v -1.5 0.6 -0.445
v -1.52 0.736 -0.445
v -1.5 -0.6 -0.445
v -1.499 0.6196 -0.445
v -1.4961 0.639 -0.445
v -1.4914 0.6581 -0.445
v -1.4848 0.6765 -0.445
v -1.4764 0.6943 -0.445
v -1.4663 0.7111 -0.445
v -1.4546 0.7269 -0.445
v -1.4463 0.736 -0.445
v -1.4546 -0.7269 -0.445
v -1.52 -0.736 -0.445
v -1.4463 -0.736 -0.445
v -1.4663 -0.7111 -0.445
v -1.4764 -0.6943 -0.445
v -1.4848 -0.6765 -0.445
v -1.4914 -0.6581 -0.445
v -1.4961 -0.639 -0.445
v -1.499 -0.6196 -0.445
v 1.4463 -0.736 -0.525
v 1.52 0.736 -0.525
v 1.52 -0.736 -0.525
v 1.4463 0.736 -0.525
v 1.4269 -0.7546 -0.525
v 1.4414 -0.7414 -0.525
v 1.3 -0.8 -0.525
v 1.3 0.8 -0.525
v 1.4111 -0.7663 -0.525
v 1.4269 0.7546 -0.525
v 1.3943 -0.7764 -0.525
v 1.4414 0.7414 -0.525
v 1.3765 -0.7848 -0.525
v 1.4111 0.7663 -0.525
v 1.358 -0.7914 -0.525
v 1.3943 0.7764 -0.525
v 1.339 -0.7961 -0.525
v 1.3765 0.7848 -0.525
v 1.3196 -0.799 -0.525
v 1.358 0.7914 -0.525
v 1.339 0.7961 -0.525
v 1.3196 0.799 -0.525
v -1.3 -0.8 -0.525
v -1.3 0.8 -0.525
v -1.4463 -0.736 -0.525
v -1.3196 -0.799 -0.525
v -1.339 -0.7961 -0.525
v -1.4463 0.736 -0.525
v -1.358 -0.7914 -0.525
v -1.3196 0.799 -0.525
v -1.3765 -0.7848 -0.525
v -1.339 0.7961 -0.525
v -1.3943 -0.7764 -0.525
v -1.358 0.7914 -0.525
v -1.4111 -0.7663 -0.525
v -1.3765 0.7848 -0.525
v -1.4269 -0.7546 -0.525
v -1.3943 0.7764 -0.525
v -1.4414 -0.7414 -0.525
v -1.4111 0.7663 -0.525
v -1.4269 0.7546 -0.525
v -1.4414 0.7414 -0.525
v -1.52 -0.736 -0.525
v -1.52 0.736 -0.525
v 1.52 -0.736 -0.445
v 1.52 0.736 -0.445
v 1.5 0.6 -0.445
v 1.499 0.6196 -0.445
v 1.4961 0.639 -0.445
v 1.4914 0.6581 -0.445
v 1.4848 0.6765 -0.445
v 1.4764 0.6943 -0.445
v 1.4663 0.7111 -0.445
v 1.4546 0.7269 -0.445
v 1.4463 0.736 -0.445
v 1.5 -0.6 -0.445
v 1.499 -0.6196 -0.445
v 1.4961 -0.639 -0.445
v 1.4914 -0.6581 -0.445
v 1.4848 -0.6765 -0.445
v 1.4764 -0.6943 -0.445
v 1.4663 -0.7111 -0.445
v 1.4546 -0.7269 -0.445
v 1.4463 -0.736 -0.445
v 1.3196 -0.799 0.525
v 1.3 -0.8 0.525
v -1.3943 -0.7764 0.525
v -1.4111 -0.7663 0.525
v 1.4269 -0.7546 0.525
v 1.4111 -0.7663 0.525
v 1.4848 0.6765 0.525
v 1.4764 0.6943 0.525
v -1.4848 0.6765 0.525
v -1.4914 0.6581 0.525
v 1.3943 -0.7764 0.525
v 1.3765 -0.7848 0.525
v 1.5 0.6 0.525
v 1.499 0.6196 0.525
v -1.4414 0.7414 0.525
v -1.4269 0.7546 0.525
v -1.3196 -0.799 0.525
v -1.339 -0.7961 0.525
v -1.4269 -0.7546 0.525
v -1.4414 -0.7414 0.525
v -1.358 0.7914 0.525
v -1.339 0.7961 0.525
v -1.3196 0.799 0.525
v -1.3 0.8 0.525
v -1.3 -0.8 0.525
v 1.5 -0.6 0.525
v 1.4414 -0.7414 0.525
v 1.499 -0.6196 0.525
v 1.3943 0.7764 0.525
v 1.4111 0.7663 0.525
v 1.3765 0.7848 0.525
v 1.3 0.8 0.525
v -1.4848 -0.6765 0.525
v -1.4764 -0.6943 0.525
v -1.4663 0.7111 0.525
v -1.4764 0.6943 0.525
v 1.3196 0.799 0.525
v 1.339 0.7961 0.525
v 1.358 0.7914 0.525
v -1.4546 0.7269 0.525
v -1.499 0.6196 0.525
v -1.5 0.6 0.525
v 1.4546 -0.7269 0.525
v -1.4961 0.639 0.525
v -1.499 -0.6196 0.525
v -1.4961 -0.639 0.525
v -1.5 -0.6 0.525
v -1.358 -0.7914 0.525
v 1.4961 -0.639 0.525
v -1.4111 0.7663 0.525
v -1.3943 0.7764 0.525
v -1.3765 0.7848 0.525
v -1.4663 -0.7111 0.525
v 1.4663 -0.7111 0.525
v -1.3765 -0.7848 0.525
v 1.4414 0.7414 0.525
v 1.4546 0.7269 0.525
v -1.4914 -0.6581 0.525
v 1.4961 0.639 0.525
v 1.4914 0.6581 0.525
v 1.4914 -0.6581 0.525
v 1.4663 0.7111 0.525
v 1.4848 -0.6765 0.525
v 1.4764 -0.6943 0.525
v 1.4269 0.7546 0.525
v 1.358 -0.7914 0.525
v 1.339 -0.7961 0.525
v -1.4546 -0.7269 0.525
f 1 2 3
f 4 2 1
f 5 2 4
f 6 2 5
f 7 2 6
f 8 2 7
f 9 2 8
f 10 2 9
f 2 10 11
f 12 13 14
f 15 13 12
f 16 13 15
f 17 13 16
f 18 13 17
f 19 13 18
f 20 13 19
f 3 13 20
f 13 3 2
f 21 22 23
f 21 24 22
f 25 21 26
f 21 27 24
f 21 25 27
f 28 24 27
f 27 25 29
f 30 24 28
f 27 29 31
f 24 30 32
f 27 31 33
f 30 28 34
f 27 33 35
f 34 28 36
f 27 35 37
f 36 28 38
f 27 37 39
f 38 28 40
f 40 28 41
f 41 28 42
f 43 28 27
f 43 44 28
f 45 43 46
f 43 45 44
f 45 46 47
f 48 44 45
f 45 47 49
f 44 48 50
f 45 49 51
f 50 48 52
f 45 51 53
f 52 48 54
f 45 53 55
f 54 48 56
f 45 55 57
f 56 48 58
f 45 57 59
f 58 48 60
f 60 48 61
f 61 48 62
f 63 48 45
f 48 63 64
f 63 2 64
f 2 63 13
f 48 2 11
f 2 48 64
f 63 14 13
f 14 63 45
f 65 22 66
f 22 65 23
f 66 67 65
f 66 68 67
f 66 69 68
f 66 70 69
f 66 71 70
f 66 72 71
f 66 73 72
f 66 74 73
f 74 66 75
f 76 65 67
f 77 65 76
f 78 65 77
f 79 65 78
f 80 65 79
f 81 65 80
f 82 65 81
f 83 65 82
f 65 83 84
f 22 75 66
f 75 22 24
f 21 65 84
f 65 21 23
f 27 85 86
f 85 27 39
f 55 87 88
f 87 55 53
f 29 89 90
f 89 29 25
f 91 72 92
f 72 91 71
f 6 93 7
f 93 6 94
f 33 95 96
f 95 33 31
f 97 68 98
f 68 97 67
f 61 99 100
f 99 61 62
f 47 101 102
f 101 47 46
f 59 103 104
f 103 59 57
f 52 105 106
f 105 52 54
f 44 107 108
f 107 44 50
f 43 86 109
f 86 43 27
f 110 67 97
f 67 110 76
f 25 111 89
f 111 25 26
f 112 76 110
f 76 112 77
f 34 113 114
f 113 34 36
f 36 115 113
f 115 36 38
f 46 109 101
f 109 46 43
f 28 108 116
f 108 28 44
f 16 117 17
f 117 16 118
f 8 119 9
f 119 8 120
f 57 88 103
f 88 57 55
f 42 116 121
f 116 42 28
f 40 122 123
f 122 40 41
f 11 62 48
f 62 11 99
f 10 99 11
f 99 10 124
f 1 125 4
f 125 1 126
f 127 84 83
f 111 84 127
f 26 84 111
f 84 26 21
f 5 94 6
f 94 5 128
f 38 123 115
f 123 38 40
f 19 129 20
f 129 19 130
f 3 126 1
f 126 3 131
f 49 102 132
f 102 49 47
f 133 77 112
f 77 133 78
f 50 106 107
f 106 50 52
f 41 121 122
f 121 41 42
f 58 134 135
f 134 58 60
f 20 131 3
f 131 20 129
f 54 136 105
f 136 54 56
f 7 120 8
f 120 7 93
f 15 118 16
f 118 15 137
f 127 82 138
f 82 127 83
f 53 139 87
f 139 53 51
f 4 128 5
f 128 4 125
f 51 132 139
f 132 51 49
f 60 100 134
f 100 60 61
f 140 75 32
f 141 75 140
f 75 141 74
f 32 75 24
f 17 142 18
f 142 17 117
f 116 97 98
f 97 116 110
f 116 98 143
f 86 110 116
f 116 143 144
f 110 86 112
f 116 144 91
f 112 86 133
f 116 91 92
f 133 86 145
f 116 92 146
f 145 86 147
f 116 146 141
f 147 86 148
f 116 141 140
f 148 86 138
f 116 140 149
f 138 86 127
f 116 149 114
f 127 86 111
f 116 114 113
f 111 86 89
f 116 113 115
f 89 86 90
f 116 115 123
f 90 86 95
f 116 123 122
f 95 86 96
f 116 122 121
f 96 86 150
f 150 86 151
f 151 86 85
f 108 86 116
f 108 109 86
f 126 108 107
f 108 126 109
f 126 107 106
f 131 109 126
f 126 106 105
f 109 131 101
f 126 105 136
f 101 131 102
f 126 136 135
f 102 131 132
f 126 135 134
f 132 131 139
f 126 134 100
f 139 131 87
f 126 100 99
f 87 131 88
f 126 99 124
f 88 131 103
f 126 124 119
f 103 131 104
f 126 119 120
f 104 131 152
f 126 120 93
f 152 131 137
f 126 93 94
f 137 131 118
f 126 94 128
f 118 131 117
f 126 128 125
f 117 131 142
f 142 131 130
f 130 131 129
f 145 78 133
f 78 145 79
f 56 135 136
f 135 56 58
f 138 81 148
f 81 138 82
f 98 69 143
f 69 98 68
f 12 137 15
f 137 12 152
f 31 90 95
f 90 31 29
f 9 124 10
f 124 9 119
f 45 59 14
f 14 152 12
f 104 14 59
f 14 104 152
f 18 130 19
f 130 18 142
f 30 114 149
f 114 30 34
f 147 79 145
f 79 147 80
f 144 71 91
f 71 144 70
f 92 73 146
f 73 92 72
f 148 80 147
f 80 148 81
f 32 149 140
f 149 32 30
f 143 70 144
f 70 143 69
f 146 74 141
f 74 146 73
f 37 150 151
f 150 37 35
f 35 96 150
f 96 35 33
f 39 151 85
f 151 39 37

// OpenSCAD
$fn=64;

module smd_body(size=[3.0, 1.6, 1.05], corner_r=0.2) {
    x=size[0]; y=size[1]; z=size[2];
    r=min(corner_r, x/2, y/2);
    linear_extrude(height=z, center=true)
        offset(r=r)
            square([x-2*r, y-2*r], center=true);
}

module smd_terminals(size=[3.0, 1.6, 1.05], term_len=0.35, term_thk=0.08, inset=0.02) {
    x=size[0]; y=size[1]; z=size[2];
    tlen=min(term_len, x/2);
    tthk=min(term_thk, z/2);
    for (sx=[-1,1]) {
        translate([sx*(x/2 - tlen/2 + inset), 0, -z/2 + tthk/2])
            cube([tlen, y*0.92, tthk], center=true);
    }
}

module smd(size=[3.0, 1.6, 1.05]) {
    union() {
        color([0.15,0.15,0.15]) smd_body(size=size, corner_r=0.2);
        color([0.75,0.75,0.75]) smd_terminals(size=size, term_len=0.35, term_thk=0.08, inset=0.02);
    }
}

smd([3.0, 1.6, 1.05]);
